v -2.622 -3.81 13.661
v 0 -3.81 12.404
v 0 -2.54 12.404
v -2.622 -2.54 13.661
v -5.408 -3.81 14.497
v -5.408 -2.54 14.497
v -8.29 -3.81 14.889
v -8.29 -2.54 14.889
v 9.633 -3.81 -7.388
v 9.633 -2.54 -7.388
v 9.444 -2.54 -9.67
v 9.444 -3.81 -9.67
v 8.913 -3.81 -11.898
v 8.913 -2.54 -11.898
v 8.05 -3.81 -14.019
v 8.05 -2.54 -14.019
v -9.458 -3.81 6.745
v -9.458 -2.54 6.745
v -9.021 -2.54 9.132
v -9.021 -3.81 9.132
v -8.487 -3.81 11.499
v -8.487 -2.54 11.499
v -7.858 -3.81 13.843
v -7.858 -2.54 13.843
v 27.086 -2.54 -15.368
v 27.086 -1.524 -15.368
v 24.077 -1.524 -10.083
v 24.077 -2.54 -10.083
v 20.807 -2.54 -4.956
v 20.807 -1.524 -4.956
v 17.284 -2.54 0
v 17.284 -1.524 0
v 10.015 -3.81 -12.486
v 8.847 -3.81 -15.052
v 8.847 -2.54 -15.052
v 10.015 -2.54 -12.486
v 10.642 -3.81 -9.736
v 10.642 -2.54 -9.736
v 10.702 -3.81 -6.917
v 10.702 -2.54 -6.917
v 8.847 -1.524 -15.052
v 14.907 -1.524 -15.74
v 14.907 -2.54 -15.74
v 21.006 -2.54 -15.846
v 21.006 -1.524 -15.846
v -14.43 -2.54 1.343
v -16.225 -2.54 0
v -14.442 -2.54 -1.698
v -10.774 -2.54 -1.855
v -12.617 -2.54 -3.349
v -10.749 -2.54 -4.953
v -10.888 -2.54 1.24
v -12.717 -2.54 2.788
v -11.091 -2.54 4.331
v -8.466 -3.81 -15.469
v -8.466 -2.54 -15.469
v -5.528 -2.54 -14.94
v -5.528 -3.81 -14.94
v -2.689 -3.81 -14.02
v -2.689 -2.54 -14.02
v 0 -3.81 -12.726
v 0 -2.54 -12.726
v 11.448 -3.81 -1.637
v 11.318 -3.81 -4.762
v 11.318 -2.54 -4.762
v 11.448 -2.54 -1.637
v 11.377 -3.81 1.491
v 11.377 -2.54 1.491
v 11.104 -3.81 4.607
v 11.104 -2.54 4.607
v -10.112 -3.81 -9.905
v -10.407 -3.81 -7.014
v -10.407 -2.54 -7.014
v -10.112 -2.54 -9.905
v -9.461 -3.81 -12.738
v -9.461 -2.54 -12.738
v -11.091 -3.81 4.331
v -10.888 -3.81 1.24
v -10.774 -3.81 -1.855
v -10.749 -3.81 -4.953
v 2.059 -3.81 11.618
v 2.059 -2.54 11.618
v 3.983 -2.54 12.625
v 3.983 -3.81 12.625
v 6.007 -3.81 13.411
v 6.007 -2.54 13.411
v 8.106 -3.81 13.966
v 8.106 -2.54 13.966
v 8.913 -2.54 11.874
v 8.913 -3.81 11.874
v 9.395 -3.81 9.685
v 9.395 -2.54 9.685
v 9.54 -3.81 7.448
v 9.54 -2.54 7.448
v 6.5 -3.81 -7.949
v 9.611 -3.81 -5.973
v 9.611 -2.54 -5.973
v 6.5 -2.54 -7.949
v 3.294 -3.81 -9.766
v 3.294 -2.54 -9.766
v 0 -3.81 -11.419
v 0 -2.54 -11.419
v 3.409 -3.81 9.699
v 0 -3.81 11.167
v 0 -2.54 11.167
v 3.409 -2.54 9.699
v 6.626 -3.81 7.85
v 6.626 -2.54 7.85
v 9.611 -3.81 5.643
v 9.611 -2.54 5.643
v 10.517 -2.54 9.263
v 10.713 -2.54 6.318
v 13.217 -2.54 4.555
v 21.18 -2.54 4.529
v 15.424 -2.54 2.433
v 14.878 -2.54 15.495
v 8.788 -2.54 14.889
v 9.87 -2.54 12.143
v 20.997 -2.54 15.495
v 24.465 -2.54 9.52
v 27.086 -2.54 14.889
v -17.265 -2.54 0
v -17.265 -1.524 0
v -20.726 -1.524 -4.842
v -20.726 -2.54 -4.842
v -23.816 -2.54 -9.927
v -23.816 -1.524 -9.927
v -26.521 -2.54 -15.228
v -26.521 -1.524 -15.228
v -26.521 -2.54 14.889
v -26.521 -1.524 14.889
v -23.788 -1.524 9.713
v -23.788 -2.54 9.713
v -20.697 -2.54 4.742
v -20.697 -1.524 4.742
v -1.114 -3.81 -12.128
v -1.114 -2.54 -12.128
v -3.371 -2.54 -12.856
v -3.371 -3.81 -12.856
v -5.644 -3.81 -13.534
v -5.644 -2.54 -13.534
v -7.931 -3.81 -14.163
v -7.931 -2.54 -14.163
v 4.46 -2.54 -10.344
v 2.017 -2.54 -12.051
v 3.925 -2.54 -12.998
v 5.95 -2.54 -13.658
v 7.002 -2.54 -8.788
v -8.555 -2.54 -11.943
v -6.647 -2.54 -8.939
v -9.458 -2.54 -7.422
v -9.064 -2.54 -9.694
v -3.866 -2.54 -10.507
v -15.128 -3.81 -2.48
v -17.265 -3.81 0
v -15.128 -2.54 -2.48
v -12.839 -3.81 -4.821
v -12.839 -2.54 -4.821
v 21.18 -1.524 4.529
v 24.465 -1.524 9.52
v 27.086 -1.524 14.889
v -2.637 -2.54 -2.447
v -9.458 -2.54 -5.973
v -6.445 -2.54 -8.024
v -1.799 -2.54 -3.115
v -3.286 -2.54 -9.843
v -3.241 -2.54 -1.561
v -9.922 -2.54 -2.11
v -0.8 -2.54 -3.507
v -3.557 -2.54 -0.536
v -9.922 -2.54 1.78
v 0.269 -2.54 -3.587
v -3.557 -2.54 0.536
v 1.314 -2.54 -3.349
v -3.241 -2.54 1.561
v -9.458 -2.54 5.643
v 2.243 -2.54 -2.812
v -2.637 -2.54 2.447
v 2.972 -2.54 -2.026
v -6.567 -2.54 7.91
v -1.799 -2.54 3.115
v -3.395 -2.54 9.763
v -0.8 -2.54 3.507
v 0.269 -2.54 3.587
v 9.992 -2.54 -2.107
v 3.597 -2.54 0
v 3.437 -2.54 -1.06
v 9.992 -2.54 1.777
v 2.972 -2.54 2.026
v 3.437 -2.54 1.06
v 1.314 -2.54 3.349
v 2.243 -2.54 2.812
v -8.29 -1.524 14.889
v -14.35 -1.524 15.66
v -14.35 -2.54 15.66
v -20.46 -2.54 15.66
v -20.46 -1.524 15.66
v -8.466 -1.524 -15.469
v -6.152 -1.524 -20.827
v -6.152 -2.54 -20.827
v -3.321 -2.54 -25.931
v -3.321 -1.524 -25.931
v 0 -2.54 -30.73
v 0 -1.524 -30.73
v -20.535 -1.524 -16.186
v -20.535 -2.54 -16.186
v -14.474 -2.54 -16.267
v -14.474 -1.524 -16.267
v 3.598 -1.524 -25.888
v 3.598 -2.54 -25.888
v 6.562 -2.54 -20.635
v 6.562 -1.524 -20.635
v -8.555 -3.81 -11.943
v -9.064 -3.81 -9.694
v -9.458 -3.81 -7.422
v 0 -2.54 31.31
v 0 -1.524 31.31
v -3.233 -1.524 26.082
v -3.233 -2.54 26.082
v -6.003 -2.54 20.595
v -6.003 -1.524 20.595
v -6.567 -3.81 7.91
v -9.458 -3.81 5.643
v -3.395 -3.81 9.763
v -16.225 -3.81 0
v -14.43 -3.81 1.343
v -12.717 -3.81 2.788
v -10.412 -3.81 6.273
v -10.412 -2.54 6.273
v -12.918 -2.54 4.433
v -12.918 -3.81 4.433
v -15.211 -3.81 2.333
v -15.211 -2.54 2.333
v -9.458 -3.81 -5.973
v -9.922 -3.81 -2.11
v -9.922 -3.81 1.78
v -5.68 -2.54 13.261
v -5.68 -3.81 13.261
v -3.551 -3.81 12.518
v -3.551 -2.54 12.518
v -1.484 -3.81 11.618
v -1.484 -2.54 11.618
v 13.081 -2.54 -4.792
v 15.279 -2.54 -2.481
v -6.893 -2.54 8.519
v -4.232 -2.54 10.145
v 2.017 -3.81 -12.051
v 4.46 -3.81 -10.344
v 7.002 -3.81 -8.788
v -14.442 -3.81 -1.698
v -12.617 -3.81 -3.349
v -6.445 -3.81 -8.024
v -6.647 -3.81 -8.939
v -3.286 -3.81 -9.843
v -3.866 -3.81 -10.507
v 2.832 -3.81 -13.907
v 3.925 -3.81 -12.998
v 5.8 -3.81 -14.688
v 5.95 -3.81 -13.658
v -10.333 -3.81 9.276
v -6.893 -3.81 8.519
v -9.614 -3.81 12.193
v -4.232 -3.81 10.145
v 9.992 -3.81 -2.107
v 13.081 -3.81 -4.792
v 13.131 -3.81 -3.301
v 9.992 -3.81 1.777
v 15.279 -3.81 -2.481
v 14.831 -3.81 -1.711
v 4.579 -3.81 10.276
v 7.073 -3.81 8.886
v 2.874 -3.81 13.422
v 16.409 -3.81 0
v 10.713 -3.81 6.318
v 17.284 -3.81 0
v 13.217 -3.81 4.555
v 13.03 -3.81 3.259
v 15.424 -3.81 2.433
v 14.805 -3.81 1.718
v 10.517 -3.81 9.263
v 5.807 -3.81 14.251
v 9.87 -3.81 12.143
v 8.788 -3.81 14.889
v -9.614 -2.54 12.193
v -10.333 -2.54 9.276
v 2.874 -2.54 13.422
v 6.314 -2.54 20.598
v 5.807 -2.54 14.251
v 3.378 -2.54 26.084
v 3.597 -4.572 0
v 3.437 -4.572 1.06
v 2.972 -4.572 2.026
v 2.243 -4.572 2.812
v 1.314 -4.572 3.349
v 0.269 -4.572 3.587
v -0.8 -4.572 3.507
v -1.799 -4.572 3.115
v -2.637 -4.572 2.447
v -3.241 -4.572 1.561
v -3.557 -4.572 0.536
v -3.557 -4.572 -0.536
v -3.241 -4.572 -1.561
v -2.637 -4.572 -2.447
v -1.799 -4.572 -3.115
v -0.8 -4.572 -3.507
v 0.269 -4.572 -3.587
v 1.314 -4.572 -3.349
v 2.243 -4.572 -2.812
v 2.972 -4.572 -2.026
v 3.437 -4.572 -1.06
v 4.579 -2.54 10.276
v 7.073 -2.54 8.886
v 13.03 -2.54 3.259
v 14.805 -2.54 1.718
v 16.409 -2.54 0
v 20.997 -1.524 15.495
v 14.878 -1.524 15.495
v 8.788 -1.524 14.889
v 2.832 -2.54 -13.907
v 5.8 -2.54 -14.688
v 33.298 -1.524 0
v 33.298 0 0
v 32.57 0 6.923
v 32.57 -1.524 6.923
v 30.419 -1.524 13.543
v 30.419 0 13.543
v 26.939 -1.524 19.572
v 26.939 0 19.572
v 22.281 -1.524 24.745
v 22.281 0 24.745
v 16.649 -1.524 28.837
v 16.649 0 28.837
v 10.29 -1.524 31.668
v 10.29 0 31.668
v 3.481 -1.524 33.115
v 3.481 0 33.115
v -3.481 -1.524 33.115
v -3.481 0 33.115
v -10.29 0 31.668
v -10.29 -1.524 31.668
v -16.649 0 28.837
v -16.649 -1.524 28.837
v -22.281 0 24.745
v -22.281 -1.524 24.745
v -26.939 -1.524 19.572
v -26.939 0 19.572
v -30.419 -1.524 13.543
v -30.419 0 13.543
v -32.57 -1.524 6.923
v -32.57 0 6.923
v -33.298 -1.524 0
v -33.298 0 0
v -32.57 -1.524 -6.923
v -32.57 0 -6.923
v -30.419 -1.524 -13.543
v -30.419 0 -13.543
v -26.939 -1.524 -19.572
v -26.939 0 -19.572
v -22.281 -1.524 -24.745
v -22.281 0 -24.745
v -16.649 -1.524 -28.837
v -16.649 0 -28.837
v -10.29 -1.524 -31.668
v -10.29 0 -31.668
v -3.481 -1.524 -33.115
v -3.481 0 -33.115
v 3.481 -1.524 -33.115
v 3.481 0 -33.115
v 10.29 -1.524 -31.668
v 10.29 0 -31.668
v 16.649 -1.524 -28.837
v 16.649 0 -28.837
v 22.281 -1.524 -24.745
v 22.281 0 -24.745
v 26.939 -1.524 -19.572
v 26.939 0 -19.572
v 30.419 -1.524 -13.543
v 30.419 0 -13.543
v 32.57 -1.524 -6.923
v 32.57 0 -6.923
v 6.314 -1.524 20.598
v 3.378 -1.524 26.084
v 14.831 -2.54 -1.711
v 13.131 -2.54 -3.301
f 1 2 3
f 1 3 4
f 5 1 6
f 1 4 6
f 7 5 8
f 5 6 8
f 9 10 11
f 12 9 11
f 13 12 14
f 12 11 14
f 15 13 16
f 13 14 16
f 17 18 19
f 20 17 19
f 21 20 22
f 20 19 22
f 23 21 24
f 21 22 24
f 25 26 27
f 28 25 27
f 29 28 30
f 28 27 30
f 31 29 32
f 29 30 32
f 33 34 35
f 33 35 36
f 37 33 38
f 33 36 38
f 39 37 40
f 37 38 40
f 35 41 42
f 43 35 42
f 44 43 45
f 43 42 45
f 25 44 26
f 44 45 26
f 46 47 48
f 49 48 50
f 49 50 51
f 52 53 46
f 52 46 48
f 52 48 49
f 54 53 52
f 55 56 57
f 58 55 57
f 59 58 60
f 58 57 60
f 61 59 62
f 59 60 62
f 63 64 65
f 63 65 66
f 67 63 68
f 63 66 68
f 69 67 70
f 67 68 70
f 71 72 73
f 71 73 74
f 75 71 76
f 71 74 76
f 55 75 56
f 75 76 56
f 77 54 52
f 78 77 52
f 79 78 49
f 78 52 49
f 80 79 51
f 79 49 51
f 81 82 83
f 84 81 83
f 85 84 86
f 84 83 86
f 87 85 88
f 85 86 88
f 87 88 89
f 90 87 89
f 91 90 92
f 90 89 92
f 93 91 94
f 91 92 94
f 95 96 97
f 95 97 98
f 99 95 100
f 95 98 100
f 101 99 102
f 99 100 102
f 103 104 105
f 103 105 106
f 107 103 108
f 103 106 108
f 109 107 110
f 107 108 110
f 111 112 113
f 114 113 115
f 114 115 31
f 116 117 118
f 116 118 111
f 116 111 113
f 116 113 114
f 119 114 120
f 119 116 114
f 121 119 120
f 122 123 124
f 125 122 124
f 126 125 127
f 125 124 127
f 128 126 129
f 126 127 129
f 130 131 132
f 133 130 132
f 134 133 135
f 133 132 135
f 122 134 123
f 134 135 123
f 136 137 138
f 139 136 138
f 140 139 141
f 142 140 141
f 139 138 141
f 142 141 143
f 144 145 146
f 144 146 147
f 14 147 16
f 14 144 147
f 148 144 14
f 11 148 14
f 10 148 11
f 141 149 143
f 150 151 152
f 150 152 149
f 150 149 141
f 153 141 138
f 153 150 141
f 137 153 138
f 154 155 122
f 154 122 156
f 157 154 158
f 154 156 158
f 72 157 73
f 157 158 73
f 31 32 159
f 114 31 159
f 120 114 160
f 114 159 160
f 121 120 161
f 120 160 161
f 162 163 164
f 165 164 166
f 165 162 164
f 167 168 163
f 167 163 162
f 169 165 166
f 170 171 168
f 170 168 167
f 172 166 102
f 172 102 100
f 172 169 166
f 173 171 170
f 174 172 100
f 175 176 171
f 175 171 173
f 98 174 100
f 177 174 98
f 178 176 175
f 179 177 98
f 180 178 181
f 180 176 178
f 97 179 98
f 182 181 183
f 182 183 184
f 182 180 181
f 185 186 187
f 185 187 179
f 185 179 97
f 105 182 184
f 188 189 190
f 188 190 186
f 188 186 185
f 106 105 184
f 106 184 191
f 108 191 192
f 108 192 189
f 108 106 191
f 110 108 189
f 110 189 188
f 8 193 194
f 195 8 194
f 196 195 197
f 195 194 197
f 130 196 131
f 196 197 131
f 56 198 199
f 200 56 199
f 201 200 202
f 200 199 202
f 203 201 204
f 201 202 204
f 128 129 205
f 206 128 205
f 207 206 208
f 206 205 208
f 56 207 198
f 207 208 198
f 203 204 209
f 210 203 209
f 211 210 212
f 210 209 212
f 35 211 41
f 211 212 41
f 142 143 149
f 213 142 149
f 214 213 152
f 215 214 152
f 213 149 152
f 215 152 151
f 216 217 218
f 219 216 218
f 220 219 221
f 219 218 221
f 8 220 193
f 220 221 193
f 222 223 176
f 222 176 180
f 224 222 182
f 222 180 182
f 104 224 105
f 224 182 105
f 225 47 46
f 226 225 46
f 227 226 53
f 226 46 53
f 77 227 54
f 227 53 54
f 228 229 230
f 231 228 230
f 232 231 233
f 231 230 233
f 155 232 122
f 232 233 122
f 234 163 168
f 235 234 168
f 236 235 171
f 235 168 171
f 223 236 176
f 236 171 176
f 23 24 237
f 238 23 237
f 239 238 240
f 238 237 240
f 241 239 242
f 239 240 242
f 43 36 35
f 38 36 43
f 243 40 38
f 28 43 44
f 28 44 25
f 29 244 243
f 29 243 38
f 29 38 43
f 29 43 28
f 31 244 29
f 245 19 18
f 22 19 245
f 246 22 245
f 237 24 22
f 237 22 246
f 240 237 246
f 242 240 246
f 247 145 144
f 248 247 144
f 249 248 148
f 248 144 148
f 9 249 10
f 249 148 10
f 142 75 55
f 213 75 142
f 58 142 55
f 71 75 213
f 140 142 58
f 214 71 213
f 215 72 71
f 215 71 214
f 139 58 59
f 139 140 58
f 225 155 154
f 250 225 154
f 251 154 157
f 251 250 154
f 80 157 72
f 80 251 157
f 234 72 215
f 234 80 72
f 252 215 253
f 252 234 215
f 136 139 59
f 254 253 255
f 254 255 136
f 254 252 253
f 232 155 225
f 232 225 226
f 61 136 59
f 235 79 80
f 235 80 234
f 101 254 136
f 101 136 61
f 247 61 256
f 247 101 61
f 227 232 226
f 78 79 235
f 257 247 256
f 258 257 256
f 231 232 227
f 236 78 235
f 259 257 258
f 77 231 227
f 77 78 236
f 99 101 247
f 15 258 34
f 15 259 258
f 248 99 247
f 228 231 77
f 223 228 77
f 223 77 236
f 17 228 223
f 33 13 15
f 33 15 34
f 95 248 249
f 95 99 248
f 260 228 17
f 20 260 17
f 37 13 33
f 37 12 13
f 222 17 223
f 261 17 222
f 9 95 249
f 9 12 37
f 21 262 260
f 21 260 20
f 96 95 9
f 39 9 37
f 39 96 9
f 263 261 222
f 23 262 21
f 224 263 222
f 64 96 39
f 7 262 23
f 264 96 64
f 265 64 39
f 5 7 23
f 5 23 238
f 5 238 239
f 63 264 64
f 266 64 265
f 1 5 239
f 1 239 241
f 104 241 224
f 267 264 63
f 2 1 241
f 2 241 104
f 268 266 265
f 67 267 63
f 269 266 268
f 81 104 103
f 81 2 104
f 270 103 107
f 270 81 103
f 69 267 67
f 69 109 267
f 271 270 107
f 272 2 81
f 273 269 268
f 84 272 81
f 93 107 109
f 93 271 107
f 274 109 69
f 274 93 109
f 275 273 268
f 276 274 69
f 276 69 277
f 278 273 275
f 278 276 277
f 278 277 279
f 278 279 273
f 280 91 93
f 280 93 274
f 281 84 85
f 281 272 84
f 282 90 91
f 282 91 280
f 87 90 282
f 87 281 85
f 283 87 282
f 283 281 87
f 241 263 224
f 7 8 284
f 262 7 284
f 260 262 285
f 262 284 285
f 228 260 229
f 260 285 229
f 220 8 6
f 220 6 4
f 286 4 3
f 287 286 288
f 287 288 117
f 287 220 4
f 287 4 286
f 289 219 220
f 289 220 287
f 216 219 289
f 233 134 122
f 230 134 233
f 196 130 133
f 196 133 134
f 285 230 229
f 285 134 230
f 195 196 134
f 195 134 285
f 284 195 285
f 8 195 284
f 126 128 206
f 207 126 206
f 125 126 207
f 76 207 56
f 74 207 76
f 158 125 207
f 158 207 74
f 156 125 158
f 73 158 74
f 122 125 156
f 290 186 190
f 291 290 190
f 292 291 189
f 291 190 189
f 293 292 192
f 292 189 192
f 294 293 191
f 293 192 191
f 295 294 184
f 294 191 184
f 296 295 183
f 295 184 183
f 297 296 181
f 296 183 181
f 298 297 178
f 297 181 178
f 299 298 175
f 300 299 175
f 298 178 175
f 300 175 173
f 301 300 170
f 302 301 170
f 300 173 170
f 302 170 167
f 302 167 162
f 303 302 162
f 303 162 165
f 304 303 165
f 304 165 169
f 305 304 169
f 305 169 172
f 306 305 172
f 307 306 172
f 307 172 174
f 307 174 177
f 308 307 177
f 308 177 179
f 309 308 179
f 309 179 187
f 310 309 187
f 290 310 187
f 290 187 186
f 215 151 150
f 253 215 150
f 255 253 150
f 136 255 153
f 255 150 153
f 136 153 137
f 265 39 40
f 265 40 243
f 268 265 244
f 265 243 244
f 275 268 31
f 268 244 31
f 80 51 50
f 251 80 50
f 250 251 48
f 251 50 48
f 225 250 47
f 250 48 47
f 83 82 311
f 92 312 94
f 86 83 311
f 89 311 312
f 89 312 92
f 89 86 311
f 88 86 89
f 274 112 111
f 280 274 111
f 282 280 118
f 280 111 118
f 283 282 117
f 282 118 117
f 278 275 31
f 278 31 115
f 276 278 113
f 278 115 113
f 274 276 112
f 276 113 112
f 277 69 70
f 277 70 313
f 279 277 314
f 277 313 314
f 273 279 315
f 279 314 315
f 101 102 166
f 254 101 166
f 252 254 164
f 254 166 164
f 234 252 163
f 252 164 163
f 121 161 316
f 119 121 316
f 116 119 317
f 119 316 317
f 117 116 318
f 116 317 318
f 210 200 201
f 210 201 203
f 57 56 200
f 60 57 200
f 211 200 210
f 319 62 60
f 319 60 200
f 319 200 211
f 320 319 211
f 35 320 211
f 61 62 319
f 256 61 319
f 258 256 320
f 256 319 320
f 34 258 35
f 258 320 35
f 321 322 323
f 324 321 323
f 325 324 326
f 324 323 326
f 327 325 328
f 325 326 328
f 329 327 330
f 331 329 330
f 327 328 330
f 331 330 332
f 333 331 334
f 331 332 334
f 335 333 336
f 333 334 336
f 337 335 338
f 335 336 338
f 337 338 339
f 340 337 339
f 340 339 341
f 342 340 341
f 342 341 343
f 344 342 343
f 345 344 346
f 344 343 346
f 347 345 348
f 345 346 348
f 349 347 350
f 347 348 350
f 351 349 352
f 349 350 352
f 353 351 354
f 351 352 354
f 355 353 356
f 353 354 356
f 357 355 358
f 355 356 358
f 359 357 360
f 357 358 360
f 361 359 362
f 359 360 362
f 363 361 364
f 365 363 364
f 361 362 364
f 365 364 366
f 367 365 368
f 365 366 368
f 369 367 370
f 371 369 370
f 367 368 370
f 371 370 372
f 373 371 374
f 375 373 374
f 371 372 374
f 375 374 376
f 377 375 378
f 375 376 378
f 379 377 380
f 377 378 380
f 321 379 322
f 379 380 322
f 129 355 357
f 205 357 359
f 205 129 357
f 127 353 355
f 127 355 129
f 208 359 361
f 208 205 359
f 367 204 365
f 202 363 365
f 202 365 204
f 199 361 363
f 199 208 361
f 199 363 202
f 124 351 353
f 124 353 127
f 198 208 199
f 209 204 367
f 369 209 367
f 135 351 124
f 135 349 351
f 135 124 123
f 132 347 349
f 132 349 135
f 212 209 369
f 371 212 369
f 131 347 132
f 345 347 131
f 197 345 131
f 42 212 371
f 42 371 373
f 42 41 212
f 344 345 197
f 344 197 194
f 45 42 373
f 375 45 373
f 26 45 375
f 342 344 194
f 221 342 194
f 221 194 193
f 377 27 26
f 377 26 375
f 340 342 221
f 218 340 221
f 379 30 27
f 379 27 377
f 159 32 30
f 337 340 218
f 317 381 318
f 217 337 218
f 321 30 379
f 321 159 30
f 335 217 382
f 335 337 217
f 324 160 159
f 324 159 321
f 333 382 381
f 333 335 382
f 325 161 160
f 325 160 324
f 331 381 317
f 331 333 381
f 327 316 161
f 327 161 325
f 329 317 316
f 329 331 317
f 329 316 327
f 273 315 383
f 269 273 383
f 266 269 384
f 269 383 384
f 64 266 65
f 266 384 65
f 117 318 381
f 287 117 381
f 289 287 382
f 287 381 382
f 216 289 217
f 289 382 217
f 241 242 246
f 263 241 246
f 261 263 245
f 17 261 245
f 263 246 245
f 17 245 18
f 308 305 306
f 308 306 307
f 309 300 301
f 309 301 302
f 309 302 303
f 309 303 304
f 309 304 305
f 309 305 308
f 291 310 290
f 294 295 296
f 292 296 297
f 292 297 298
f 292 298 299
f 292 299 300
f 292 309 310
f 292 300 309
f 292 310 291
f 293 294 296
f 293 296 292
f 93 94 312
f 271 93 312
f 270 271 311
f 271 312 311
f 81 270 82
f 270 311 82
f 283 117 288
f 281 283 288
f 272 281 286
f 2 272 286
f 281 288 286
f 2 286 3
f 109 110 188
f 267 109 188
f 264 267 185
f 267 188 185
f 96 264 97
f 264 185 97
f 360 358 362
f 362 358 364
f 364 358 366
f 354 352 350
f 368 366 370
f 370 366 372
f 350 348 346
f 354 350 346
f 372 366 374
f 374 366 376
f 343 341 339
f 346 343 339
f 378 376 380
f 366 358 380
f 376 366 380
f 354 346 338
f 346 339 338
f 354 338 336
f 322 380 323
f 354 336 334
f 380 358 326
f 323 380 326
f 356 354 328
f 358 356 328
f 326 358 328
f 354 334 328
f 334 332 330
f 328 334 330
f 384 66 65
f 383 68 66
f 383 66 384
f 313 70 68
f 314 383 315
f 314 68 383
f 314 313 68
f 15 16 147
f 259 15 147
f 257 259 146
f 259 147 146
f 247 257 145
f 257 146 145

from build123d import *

# Parameters (mm, degrees)
F2_R     = 3.597318
F3_DEPTH = 4.572
F1_R     = 33.297868
F4_DEPTH = 1.524
F6_DEPTH = 2.286
F7_DEPTH = 1.016


with BuildPart() as f3:
    # F2 (on face) → F3 (new body)
    with BuildSketch(Plane.XZ):
        Circle(F2_R)
    extrude(amount=F3_DEPTH)

    # F1 (on Front) → F4 (join)
    with BuildSketch(Plane.XZ):
        Circle(F1_R)
    extrude(amount=F4_DEPTH)

    # F5 (on face) → F6 (join)
    with BuildSketch(Plane.XZ.offset(1.524)):
        with BuildLine():
            ThreePointArc((10.713429, 6.318242), (10.248964, 10.715615), (8.788303, 14.889233))
            ThreePointArc((8.788303, 14.889233), (4.333719, 13.860328), (0, 12.40402))
            ThreePointArc((0, 12.40402), (-3.998899, 14.133336), (-8.289627, 14.889233))
            ThreePointArc((-8.289627, 14.889233), (-10.051786, 10.753928), (-10.412228, 6.273299))
            ThreePointArc((-10.412228, 6.273299), (-14.092567, 3.413894), (-17.265329, 0))
            ThreePointArc((-17.265329, 0), (-14.001547, -3.668596), (-10.406789, -7.01353))
            ThreePointArc((-10.406789, -7.01353), (-9.830191, -11.331497), (-8.465515, -15.468521))
            ThreePointArc((-8.465515, -15.468521), (-4.093198, -14.52777), (0, -12.725577))
            ThreePointArc((0, -12.725577), (4.302612, -14.348925), (8.847156, -15.052379))
            ThreePointArc((8.847156, -15.052379), (10.398679, -11.127024), (10.702084, -6.917085))
            ThreePointArc((10.702084, -6.917085), (14.203553, -3.658977), (17.283723, 0))
            ThreePointArc((17.283723, 0), (14.361308, 3.536323), (10.713429, 6.318242))
        make_face()
        with BuildLine():
            ThreePointArc((-10.74901, -4.952658), (-13.534815, -2.529093), (-16.22518, 0))
            ThreePointArc((-16.22518, 0), (-13.56313, 2.052862), (-11.09127, 4.331163))
            ThreePointArc((-11.09127, 4.331163), (-10.819822, -0.307049), (-10.74901, -4.952658))
        make_face(mode=Mode.SUBTRACT)
        with BuildLine():
            ThreePointArc((-1.113919, -12.127829), (-4.506024, -13.201244), (-7.931484, -14.162923))
            ThreePointArc((-7.931484, -14.162923), (-8.823734, -10.821527), (-9.457804, -7.421674))
            ThreePointArc((-9.457804, -7.421674), (-5.253039, -9.716557), (-1.113919, -12.127829))
        make_face(mode=Mode.SUBTRACT)
        with BuildLine():
            ThreePointArc((9.610696, -5.973405), (4.908164, -8.877536), (0, -11.418739))
            ThreePointArc((0, -11.418739), (-4.882883, -8.963516), (-9.457804, -5.973405))
            ThreePointArc((-9.457804, -5.973405), (-9.979883, -0.165049), (-9.457804, 5.643307))
            ThreePointArc((-9.457804, 5.643307), (-5.012545, 8.890946), (0, 11.167321))
            ThreePointArc((0, 11.167321), (5.044159, 8.820798), (9.610696, 5.643307))
            ThreePointArc((9.610696, 5.643307), (10.039267, -0.165049), (9.610696, -5.973405))
        make_face(mode=Mode.SUBTRACT)
        with BuildLine():
            ThreePointArc((9.632519, -7.387693), (9.220737, -10.79398), (8.049564, -14.018993))
            ThreePointArc((8.049564, -14.018993), (4.925761, -13.364903), (2.01722, -12.050994))
            ThreePointArc((2.01722, -12.050994), (5.719103, -9.546625), (9.632519, -7.387693))
        make_face(mode=Mode.SUBTRACT)
        with BuildLine():
            ThreePointArc((11.104458, 4.606938), (13.937738, 2.51162), (16.409498, 0))
            ThreePointArc((16.409498, 0), (13.995151, -2.521496), (11.318372, -4.762447))
            ThreePointArc((11.318372, -4.762447), (11.437982, -0.072581), (11.104458, 4.606938))
        make_face(mode=Mode.SUBTRACT)
        with BuildLine():
            ThreePointArc((-9.457804, 6.745422), (-8.765935, 10.318411), (-7.858452, 13.842813))
            ThreePointArc((-7.858452, 13.842813), (-4.608306, 12.909868), (-1.483598, 11.617566))
            ThreePointArc((-1.483598, 11.617566), (-5.574191, 9.350874), (-9.457804, 6.745422))
        make_face(mode=Mode.SUBTRACT)
        with BuildLine():
            ThreePointArc((8.106259, 13.965921), (9.19576, 10.788913), (9.540202, 7.447992))
            ThreePointArc((9.540202, 7.447992), (5.829565, 9.586664), (2.058865, 11.617566))
            ThreePointArc((2.058865, 11.617566), (4.983842, 13.045962), (8.106259, 13.965921))
        make_face(mode=Mode.SUBTRACT)
    extrude(amount=F6_DEPTH)

    # F5 (on face) → F7 (join)
    with BuildSketch(Plane.XZ.offset(1.524)):
        with BuildLine():
            ThreePointArc((-10.412228, 6.273299), (-10.051786, 10.753928), (-8.289627, 14.889233))
            ThreePointArc((-8.289627, 14.889233), (-17.405207, 15.756847), (-26.520787, 14.889233))
            ThreePointArc((-26.520787, 14.889233), (-22.28618, 7.200243), (-17.265329, 0))
            ThreePointArc((-17.265329, 0), (-14.092567, 3.413894), (-10.412228, 6.273299))
        make_face()
        with BuildLine():
            ThreePointArc((0, 12.40402), (4.333719, 13.860328), (8.788303, 14.889233))
            ThreePointArc((8.788303, 14.889233), (4.902081, 23.371612), (0, 31.31032))
            ThreePointArc((0, 31.31032), (-4.677616, 23.368743), (-8.289627, 14.889233))
            ThreePointArc((-8.289627, 14.889233), (-3.998899, 14.133336), (0, 12.40402))
        make_face()
        with BuildLine():
            ThreePointArc((27.086085, 14.889233), (17.937194, 15.570442), (8.788303, 14.889233))
            ThreePointArc((8.788303, 14.889233), (10.248964, 10.715615), (10.713429, 6.318242))
            ThreePointArc((10.713429, 6.318242), (14.361308, 3.536323), (17.283723, 0))
            ThreePointArc((17.283723, 0), (22.902766, 6.97201), (27.086085, 14.889233))
        make_face()
        with BuildLine():
            ThreePointArc((27.086085, -15.368001), (22.47422, -7.499462), (17.283723, 0))
            ThreePointArc((17.283723, 0), (14.203553, -3.658977), (10.702084, -6.917085))
            ThreePointArc((10.702084, -6.917085), (10.398679, -11.127024), (8.847156, -15.052379))
            ThreePointArc((8.847156, -15.052379), (17.955268, -15.866193), (27.086085, -15.368001))
        make_face()
        with BuildLine():
            ThreePointArc((0, -30.730024), (5.16221, -23.308024), (8.847156, -15.052379))
            ThreePointArc((8.847156, -15.052379), (4.302612, -14.348925), (0, -12.725577))
            ThreePointArc((0, -12.725577), (-4.093198, -14.52777), (-8.465515, -15.468521))
            ThreePointArc((-8.465515, -15.468521), (-4.799827, -23.413825), (0, -30.730024))
        make_face()
        with BuildLine():
            ThreePointArc((-10.406789, -7.01353), (-14.001547, -3.668596), (-17.265329, 0))
            ThreePointArc((-17.265329, 0), (-22.318324, -7.35541), (-26.520787, -15.227773))
            ThreePointArc((-26.520787, -15.227773), (-17.506335, -16.336903), (-8.465515, -15.468521))
            ThreePointArc((-8.465515, -15.468521), (-9.830191, -11.331497), (-10.406789, -7.01353))
        make_face()
        with BuildLine():
            ThreePointArc((-9.457804, -7.421674), (-8.823734, -10.821527), (-7.931484, -14.162923))
            ThreePointArc((-7.931484, -14.162923), (-4.506024, -13.201244), (-1.113919, -12.127829))
            ThreePointArc((-1.113919, -12.127829), (-5.253039, -9.716557), (-9.457804, -7.421674))
        make_face()
        with BuildLine():
            ThreePointArc((2.01722, -12.050994), (4.925761, -13.364903), (8.049564, -14.018993))
            ThreePointArc((8.049564, -14.018993), (9.220737, -10.79398), (9.632519, -7.387693))
            ThreePointArc((9.632519, -7.387693), (5.719103, -9.546625), (2.01722, -12.050994))
        make_face()
        with BuildLine():
            ThreePointArc((-9.457804, -5.973405), (-4.882883, -8.963516), (0, -11.418739))
            ThreePointArc((0, -11.418739), (4.908164, -8.877536), (9.610696, -5.973405))
            ThreePointArc((9.610696, -5.973405), (10.039267, -0.165049), (9.610696, 5.643307))
            ThreePointArc((9.610696, 5.643307), (5.044159, 8.820798), (0, 11.167321))
            ThreePointArc((0, 11.167321), (-5.012545, 8.890946), (-9.457804, 5.643307))
            ThreePointArc((-9.457804, 5.643307), (-9.979883, -0.165049), (-9.457804, -5.973405))
        make_face()
        with BuildLine():
            ThreePointArc((11.318372, -4.762447), (13.995151, -2.521496), (16.409498, 0))
            ThreePointArc((16.409498, 0), (13.937738, 2.51162), (11.104458, 4.606938))
            ThreePointArc((11.104458, 4.606938), (11.437982, -0.072581), (11.318372, -4.762447))
        make_face()
        with BuildLine():
            ThreePointArc((-1.483598, 11.617566), (-4.608306, 12.909868), (-7.858452, 13.842813))
            ThreePointArc((-7.858452, 13.842813), (-8.765935, 10.318411), (-9.457804, 6.745422))
            ThreePointArc((-9.457804, 6.745422), (-5.574191, 9.350874), (-1.483598, 11.617566))
        make_face()
        with BuildLine():
            ThreePointArc((2.058865, 11.617566), (5.829565, 9.586664), (9.540202, 7.447992))
            ThreePointArc((9.540202, 7.447992), (9.19576, 10.788913), (8.106259, 13.965921))
            ThreePointArc((8.106259, 13.965921), (4.983842, 13.045962), (2.058865, 11.617566))
        make_face()
        with BuildLine():
            ThreePointArc((-11.09127, 4.331163), (-13.56313, 2.052862), (-16.22518, 0))
            ThreePointArc((-16.22518, 0), (-13.534815, -2.529093), (-10.74901, -4.952658))
            ThreePointArc((-10.74901, -4.952658), (-10.819822, -0.307049), (-11.09127, 4.331163))
        make_face()
    extrude(amount=F7_DEPTH)


solid = f3.part
